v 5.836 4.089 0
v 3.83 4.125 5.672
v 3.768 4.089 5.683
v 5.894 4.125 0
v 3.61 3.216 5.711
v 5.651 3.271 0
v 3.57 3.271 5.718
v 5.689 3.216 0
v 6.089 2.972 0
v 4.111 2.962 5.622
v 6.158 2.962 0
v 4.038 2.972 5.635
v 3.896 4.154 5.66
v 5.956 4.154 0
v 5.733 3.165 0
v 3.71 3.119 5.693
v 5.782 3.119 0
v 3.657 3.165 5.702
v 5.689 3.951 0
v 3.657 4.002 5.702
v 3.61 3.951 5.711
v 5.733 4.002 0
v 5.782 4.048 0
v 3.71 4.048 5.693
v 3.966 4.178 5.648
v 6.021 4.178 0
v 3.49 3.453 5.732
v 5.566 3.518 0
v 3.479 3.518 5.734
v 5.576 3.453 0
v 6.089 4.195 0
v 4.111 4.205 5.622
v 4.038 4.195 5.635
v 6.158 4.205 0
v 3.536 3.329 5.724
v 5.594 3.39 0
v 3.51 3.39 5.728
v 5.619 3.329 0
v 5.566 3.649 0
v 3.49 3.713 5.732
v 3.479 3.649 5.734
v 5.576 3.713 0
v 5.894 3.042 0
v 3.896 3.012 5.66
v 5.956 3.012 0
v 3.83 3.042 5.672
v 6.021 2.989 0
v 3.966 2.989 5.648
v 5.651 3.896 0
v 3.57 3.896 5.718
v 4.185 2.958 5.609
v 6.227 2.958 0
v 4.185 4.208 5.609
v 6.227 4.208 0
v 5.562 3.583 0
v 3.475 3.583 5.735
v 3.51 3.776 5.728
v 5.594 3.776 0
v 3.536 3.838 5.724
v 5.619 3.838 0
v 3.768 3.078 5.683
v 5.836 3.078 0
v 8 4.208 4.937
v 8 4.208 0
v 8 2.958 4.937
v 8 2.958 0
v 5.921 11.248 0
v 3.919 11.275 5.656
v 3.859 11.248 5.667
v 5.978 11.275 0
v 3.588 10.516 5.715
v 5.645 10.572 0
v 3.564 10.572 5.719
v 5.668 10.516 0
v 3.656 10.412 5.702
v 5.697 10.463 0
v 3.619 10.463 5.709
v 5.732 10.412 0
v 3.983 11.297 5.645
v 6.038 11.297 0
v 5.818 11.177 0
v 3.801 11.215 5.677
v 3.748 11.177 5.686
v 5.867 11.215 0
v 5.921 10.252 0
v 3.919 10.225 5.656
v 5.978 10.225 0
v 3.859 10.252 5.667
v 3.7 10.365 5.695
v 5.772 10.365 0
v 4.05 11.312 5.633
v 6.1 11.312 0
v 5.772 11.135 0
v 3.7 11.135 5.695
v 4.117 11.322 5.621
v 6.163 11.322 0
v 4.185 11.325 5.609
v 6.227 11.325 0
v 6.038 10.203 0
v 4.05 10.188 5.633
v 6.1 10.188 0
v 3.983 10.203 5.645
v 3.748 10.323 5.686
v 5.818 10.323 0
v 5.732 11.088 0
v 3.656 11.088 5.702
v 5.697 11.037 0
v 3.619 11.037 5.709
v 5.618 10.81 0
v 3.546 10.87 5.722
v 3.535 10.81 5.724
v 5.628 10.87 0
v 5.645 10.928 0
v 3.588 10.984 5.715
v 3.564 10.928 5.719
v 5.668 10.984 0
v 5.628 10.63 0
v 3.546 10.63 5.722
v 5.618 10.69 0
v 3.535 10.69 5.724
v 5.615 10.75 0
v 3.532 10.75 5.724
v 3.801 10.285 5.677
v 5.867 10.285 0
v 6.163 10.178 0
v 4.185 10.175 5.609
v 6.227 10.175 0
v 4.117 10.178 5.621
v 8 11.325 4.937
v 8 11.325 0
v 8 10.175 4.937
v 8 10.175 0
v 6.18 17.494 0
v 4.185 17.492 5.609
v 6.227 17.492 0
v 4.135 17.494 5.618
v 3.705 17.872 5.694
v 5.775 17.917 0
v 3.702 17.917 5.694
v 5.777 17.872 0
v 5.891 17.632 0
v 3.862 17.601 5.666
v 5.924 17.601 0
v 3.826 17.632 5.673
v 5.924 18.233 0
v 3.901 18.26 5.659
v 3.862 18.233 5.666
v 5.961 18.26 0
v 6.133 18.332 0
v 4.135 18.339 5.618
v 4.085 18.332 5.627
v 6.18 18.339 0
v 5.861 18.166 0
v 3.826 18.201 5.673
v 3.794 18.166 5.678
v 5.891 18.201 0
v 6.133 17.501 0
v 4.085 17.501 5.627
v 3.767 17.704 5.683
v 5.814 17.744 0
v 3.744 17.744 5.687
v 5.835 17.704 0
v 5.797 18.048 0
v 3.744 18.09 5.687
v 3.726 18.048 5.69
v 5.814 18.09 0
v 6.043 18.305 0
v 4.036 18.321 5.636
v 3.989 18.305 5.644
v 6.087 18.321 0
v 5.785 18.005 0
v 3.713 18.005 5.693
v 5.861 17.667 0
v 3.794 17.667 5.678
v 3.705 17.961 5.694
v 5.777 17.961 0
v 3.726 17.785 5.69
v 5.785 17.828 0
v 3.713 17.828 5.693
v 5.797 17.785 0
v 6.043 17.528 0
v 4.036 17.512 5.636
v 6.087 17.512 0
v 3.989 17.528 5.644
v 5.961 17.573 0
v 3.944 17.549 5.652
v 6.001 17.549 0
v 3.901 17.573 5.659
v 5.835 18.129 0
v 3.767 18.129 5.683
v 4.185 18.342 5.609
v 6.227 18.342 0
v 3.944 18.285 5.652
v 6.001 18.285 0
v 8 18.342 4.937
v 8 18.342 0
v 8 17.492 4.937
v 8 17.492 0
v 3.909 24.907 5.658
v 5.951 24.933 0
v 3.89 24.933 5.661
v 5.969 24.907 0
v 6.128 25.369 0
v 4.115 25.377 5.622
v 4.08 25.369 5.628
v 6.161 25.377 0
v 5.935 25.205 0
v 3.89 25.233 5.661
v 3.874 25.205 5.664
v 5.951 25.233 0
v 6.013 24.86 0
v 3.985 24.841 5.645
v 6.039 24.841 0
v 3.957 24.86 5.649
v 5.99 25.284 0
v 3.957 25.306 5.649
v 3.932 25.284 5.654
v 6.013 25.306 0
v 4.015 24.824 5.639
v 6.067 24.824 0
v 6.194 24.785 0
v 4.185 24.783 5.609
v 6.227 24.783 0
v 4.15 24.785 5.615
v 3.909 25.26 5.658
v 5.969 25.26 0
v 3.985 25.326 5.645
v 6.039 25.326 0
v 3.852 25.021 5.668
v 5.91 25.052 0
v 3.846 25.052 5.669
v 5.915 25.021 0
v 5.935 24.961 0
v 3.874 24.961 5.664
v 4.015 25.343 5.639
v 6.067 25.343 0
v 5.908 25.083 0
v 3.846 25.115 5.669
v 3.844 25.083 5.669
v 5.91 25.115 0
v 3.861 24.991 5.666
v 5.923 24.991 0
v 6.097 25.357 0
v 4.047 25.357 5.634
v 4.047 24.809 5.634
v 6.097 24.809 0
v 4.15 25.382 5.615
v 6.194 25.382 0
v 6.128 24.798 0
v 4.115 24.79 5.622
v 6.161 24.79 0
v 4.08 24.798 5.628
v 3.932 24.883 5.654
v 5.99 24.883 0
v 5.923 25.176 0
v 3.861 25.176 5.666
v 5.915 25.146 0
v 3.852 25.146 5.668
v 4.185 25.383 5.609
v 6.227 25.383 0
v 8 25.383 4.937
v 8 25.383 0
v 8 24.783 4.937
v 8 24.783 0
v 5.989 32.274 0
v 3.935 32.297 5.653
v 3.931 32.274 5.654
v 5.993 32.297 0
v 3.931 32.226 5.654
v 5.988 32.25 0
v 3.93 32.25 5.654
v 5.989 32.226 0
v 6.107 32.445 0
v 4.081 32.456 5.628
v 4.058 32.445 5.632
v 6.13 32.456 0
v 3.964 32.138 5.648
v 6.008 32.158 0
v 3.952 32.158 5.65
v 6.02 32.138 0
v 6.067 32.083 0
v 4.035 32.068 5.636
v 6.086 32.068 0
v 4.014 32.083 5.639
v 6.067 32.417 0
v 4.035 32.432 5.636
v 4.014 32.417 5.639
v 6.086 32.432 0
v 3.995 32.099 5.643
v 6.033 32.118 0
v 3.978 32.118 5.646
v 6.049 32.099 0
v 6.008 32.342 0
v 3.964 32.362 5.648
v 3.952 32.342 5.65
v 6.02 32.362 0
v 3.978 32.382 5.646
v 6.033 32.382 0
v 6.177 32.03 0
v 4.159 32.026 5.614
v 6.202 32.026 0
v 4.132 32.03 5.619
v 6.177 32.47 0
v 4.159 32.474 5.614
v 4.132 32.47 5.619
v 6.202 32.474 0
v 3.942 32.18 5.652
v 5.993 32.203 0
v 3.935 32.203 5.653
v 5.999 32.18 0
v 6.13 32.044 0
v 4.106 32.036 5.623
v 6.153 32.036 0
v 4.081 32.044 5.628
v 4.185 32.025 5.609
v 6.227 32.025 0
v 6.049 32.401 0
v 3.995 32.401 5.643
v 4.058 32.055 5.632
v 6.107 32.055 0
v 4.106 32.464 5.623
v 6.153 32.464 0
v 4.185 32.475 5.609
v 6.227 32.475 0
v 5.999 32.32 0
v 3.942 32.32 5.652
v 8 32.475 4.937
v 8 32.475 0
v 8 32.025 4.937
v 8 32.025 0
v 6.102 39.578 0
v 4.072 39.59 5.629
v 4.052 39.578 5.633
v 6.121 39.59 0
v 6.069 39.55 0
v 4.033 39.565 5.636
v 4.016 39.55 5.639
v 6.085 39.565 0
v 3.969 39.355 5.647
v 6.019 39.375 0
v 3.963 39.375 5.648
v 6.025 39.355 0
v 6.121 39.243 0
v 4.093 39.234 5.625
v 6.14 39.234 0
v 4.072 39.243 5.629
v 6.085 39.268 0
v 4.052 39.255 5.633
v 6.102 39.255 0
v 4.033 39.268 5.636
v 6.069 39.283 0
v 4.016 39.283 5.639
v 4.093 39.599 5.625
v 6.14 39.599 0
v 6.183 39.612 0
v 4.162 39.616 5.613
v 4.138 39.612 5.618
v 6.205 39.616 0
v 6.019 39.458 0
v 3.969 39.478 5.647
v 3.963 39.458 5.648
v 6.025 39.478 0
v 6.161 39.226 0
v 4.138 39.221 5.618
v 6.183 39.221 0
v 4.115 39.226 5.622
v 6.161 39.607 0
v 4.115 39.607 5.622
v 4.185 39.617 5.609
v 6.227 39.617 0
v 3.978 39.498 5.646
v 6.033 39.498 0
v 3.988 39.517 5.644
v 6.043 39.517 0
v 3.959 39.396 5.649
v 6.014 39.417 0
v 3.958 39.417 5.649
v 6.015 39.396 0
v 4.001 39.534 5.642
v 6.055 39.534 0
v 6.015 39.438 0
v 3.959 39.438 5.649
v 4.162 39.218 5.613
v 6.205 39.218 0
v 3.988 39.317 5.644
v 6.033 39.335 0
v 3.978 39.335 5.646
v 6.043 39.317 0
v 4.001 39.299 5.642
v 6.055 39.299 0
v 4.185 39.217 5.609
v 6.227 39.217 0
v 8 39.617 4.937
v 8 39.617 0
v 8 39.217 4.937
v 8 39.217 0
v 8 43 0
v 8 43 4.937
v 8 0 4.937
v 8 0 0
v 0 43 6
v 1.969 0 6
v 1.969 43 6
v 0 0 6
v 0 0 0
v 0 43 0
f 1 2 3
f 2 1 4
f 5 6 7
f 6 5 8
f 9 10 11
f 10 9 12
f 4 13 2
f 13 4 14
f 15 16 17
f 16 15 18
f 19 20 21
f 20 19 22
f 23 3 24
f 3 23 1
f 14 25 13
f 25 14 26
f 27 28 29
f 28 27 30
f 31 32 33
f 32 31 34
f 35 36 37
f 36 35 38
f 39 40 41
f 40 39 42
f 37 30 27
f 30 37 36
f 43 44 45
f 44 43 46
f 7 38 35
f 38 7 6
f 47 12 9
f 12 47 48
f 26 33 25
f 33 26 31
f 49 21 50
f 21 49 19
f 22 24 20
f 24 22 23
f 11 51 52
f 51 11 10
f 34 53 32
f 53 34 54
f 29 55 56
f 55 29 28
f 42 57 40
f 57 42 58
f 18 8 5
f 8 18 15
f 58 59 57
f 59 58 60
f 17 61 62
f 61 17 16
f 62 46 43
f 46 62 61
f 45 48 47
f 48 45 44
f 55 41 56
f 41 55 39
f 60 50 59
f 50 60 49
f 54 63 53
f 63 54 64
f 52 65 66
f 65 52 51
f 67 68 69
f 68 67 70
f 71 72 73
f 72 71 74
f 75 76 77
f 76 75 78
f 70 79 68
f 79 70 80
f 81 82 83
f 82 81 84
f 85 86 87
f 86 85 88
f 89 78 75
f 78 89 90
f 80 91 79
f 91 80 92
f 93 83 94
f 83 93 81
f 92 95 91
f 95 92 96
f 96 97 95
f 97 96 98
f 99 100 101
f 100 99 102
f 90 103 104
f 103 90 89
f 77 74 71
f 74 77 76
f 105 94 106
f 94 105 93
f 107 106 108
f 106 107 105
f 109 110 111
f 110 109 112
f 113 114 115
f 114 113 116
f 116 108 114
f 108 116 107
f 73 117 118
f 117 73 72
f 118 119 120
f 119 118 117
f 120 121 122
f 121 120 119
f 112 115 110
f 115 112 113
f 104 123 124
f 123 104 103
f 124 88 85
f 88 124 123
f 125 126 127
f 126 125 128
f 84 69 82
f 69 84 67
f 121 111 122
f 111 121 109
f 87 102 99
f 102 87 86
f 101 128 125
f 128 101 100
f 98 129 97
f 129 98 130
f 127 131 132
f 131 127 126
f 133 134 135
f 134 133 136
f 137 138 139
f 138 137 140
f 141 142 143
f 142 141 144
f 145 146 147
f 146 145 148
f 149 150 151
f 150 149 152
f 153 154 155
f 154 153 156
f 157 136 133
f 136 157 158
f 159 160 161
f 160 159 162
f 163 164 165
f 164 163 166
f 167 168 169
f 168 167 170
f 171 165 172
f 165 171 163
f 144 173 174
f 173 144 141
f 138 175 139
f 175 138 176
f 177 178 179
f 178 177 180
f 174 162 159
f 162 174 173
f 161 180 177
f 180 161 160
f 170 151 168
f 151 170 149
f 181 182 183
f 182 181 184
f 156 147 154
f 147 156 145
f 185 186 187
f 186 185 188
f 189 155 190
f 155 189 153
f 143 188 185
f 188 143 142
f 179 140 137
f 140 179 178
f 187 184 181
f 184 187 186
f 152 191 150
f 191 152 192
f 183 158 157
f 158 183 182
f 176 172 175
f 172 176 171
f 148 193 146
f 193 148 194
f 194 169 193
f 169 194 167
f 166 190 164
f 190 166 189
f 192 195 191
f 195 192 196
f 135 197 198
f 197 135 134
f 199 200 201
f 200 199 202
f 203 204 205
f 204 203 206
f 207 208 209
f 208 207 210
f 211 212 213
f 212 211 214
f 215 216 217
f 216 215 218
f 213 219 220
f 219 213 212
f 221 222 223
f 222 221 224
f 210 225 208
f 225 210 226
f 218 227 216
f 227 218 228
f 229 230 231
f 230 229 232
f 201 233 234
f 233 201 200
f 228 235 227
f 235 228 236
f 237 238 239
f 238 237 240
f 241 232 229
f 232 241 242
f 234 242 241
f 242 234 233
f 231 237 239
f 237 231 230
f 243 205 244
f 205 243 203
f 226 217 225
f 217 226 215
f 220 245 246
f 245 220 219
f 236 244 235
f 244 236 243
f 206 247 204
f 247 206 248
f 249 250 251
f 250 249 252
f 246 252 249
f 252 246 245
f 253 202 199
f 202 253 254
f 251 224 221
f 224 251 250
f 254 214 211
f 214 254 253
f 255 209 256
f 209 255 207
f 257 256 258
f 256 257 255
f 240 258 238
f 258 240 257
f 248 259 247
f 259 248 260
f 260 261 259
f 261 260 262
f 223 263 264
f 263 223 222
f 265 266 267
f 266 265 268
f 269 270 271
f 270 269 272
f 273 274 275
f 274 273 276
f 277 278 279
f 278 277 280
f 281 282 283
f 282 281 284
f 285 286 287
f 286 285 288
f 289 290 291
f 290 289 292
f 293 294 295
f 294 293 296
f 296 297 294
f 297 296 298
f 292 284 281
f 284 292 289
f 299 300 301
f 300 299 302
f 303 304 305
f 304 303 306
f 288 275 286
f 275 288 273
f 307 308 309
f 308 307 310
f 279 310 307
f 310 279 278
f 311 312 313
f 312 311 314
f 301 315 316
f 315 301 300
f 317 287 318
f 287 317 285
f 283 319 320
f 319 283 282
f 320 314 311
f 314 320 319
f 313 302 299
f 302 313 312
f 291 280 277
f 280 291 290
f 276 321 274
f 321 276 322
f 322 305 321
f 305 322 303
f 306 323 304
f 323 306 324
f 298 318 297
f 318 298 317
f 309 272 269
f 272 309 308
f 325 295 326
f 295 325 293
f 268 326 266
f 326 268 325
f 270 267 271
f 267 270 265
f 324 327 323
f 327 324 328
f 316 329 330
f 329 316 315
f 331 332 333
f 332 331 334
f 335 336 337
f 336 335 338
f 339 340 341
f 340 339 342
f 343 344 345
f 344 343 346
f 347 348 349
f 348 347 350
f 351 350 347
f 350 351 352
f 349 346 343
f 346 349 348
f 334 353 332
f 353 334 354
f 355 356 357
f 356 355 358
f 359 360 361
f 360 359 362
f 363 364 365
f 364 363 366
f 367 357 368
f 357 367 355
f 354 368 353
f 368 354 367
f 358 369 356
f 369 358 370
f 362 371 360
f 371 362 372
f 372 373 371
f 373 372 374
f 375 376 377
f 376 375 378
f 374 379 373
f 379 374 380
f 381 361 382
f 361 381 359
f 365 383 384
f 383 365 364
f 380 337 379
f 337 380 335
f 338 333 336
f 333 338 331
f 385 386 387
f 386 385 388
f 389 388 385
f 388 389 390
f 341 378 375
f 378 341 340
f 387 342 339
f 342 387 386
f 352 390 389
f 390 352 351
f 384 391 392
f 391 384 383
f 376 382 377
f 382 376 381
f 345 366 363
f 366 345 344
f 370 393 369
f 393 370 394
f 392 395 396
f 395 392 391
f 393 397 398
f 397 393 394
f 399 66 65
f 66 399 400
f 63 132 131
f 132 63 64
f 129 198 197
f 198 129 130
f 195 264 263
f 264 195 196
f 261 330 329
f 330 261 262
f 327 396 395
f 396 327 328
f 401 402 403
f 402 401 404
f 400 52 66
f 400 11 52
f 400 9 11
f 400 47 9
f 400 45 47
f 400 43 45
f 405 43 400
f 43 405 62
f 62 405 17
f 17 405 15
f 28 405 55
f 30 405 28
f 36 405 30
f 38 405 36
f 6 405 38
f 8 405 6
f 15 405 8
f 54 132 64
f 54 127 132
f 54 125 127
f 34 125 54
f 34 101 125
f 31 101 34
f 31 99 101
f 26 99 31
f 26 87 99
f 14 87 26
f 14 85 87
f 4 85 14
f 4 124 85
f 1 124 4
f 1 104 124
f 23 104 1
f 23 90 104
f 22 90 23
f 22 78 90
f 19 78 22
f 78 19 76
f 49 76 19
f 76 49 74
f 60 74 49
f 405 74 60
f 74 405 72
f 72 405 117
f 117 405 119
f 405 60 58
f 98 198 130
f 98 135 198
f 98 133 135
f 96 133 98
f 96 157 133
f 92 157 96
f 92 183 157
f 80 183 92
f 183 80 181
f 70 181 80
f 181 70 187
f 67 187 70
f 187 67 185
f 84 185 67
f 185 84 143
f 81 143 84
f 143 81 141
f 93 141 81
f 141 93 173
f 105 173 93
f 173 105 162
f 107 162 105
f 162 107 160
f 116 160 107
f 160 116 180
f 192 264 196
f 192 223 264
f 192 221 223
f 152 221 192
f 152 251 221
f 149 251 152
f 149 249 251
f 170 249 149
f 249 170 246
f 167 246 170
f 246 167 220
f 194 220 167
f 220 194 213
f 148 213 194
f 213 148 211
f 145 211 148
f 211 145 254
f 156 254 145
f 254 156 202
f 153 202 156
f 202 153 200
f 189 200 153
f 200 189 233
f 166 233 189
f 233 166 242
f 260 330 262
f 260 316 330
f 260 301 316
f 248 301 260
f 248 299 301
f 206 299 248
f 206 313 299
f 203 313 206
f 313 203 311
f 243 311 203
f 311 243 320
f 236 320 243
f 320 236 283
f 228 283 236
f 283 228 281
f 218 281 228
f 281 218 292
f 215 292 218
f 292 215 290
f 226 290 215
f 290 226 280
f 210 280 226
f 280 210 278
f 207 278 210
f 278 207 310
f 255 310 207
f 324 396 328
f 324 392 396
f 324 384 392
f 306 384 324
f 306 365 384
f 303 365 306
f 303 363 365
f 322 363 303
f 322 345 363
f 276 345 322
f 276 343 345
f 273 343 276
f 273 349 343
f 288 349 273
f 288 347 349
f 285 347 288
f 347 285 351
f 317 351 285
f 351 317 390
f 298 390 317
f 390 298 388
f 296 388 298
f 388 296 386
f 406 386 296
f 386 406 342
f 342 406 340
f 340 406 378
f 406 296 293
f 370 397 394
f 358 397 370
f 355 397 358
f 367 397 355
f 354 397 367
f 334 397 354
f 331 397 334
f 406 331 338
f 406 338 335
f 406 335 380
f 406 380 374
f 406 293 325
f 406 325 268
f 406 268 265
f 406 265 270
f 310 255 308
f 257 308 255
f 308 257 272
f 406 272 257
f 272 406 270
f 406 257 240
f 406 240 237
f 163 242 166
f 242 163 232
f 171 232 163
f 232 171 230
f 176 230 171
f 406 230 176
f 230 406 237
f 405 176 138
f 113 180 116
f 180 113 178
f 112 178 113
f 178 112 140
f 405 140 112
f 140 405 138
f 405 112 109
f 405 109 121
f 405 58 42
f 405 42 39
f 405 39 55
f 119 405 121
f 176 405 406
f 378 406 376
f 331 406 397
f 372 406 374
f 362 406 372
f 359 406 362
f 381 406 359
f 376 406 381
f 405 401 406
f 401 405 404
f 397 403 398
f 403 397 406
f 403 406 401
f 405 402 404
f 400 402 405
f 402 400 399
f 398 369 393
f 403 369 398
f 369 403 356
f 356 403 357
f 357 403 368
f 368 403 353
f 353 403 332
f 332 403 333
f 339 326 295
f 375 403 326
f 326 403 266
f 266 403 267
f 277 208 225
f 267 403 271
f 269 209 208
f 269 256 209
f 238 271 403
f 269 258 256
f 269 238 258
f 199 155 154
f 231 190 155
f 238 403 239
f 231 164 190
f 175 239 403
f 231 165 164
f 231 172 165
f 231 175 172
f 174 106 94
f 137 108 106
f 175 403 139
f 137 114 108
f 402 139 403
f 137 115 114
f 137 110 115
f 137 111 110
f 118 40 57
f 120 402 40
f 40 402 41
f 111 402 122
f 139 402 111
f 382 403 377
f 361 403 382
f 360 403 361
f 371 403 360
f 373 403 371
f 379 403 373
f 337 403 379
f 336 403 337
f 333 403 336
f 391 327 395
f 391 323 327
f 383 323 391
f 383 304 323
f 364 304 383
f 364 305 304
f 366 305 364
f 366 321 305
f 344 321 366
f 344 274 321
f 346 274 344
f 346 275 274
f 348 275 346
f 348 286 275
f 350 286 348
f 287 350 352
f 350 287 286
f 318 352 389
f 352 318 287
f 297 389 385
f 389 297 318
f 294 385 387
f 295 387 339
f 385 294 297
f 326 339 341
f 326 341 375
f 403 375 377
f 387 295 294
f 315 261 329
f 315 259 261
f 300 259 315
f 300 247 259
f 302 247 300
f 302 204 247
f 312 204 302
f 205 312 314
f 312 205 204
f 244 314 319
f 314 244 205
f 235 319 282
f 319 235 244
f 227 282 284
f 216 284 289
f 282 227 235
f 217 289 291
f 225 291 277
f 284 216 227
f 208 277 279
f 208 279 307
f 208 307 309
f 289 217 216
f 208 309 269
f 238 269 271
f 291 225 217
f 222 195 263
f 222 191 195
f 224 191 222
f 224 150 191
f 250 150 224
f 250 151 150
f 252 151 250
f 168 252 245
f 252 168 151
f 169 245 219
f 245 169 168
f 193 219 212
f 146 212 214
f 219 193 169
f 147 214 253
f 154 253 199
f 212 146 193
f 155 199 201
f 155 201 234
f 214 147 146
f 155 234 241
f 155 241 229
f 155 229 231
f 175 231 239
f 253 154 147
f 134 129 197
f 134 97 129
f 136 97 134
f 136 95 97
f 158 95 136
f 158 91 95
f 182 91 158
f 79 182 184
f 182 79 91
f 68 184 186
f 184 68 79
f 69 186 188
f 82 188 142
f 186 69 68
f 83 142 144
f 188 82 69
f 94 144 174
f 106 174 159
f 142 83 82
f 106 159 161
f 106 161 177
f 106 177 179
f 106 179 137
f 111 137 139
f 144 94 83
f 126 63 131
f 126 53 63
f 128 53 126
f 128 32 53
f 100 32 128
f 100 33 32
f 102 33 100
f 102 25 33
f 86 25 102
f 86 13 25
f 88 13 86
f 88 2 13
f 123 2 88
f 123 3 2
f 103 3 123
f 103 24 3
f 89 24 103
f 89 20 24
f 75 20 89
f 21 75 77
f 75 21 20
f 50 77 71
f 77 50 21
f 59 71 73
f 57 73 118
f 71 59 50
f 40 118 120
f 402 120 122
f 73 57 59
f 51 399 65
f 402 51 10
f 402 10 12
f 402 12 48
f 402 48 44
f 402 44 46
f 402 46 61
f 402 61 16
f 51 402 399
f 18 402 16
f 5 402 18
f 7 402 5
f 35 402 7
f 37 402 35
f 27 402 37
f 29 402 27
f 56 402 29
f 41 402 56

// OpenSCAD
/* [Nut Settings] */
// Number of strings to use. All equally spaced.
String_Count = 6; // [1:8]

// Width of entire nut in millimeters
Nut_Width = 43; // [10:100]

// Thickness of horizontal part in millimeters
Nut_Height_Padding = 2; // [0:10]

// Depth of nut, measured in the direction of the strings, in millimeters
Nut_Depth = 6; // [1:10]

// Angle of strings within nut
String_Angle = 20; // [0:60]

/* [String Widths] */
// Width of string #1 in millimeters
String_Width_1 = 1.25; // [0.1:10]

// Width of string #2 in millimeters
String_Width_2 = 1.15; // [0.1:10]

// Width of string #3 in millimeters
String_Width_3 = 0.85; // [0.1:10]

// Width of string #4 in millimeters
String_Width_4 = 0.60; // [0.1:10]

// Width of string #5 in millimeters
String_Width_5 = 0.45; // [0.1:10]

// Width of string #6 in millimeters
String_Width_6 = 0.40; // [0.1:10]

// Width of string #7 in millimeters
String_Width_7 = 0.35; // [0.1:10]

// Width of string #8 in millimeters
String_Width_8 = 0.30; // [0.1:10]

/* [Hidden] */
String_Spacing = (Nut_Width / String_Count);
String_Padding = String_Spacing / 2;

/*
	Guitar nut for acoustic guitar
*/

function GetStringWidth(i) =
	lookup
	(
		i,
		[
			[0, String_Width_1],
			[1, String_Width_2],
			[2, String_Width_3],
			[3, String_Width_4],
			[4, String_Width_5],
			[5, String_Width_6],
			[6, String_Width_7],
			[7, String_Width_8]
		]
	);

module MakeGaps()
{
	for (i = [0:(String_Count - 1)])
	{
		translate([4.5 + Nut_Height_Padding, String_Padding + (String_Spacing * i), (-0.75)])
			rotate([0, (-String_Angle), 0])
				union()
				{
					cylinder(h = (Nut_Depth + 4), d = GetStringWidth(i), $fn = 60);
					translate([5, 0, (Nut_Depth / 2) + 2])
						cube([10, GetStringWidth(i), (Nut_Depth + 4)],center = true);
				}
	}
}

module Main()
{
	difference()
	{
		// The base cube
		cube([6 + Nut_Height_Padding, Nut_Width, Nut_Depth]);

		// Cutting off the end in angle
		translate([2.5 + Nut_Height_Padding, (Nut_Width / 2), (Nut_Depth + 2.6)])
			rotate(a = [0, 10, 0])
				cube([9, Nut_Width + 1, 6], center = true);

		// Gaps for the strings
		MakeGaps();
	}
}

Main();
